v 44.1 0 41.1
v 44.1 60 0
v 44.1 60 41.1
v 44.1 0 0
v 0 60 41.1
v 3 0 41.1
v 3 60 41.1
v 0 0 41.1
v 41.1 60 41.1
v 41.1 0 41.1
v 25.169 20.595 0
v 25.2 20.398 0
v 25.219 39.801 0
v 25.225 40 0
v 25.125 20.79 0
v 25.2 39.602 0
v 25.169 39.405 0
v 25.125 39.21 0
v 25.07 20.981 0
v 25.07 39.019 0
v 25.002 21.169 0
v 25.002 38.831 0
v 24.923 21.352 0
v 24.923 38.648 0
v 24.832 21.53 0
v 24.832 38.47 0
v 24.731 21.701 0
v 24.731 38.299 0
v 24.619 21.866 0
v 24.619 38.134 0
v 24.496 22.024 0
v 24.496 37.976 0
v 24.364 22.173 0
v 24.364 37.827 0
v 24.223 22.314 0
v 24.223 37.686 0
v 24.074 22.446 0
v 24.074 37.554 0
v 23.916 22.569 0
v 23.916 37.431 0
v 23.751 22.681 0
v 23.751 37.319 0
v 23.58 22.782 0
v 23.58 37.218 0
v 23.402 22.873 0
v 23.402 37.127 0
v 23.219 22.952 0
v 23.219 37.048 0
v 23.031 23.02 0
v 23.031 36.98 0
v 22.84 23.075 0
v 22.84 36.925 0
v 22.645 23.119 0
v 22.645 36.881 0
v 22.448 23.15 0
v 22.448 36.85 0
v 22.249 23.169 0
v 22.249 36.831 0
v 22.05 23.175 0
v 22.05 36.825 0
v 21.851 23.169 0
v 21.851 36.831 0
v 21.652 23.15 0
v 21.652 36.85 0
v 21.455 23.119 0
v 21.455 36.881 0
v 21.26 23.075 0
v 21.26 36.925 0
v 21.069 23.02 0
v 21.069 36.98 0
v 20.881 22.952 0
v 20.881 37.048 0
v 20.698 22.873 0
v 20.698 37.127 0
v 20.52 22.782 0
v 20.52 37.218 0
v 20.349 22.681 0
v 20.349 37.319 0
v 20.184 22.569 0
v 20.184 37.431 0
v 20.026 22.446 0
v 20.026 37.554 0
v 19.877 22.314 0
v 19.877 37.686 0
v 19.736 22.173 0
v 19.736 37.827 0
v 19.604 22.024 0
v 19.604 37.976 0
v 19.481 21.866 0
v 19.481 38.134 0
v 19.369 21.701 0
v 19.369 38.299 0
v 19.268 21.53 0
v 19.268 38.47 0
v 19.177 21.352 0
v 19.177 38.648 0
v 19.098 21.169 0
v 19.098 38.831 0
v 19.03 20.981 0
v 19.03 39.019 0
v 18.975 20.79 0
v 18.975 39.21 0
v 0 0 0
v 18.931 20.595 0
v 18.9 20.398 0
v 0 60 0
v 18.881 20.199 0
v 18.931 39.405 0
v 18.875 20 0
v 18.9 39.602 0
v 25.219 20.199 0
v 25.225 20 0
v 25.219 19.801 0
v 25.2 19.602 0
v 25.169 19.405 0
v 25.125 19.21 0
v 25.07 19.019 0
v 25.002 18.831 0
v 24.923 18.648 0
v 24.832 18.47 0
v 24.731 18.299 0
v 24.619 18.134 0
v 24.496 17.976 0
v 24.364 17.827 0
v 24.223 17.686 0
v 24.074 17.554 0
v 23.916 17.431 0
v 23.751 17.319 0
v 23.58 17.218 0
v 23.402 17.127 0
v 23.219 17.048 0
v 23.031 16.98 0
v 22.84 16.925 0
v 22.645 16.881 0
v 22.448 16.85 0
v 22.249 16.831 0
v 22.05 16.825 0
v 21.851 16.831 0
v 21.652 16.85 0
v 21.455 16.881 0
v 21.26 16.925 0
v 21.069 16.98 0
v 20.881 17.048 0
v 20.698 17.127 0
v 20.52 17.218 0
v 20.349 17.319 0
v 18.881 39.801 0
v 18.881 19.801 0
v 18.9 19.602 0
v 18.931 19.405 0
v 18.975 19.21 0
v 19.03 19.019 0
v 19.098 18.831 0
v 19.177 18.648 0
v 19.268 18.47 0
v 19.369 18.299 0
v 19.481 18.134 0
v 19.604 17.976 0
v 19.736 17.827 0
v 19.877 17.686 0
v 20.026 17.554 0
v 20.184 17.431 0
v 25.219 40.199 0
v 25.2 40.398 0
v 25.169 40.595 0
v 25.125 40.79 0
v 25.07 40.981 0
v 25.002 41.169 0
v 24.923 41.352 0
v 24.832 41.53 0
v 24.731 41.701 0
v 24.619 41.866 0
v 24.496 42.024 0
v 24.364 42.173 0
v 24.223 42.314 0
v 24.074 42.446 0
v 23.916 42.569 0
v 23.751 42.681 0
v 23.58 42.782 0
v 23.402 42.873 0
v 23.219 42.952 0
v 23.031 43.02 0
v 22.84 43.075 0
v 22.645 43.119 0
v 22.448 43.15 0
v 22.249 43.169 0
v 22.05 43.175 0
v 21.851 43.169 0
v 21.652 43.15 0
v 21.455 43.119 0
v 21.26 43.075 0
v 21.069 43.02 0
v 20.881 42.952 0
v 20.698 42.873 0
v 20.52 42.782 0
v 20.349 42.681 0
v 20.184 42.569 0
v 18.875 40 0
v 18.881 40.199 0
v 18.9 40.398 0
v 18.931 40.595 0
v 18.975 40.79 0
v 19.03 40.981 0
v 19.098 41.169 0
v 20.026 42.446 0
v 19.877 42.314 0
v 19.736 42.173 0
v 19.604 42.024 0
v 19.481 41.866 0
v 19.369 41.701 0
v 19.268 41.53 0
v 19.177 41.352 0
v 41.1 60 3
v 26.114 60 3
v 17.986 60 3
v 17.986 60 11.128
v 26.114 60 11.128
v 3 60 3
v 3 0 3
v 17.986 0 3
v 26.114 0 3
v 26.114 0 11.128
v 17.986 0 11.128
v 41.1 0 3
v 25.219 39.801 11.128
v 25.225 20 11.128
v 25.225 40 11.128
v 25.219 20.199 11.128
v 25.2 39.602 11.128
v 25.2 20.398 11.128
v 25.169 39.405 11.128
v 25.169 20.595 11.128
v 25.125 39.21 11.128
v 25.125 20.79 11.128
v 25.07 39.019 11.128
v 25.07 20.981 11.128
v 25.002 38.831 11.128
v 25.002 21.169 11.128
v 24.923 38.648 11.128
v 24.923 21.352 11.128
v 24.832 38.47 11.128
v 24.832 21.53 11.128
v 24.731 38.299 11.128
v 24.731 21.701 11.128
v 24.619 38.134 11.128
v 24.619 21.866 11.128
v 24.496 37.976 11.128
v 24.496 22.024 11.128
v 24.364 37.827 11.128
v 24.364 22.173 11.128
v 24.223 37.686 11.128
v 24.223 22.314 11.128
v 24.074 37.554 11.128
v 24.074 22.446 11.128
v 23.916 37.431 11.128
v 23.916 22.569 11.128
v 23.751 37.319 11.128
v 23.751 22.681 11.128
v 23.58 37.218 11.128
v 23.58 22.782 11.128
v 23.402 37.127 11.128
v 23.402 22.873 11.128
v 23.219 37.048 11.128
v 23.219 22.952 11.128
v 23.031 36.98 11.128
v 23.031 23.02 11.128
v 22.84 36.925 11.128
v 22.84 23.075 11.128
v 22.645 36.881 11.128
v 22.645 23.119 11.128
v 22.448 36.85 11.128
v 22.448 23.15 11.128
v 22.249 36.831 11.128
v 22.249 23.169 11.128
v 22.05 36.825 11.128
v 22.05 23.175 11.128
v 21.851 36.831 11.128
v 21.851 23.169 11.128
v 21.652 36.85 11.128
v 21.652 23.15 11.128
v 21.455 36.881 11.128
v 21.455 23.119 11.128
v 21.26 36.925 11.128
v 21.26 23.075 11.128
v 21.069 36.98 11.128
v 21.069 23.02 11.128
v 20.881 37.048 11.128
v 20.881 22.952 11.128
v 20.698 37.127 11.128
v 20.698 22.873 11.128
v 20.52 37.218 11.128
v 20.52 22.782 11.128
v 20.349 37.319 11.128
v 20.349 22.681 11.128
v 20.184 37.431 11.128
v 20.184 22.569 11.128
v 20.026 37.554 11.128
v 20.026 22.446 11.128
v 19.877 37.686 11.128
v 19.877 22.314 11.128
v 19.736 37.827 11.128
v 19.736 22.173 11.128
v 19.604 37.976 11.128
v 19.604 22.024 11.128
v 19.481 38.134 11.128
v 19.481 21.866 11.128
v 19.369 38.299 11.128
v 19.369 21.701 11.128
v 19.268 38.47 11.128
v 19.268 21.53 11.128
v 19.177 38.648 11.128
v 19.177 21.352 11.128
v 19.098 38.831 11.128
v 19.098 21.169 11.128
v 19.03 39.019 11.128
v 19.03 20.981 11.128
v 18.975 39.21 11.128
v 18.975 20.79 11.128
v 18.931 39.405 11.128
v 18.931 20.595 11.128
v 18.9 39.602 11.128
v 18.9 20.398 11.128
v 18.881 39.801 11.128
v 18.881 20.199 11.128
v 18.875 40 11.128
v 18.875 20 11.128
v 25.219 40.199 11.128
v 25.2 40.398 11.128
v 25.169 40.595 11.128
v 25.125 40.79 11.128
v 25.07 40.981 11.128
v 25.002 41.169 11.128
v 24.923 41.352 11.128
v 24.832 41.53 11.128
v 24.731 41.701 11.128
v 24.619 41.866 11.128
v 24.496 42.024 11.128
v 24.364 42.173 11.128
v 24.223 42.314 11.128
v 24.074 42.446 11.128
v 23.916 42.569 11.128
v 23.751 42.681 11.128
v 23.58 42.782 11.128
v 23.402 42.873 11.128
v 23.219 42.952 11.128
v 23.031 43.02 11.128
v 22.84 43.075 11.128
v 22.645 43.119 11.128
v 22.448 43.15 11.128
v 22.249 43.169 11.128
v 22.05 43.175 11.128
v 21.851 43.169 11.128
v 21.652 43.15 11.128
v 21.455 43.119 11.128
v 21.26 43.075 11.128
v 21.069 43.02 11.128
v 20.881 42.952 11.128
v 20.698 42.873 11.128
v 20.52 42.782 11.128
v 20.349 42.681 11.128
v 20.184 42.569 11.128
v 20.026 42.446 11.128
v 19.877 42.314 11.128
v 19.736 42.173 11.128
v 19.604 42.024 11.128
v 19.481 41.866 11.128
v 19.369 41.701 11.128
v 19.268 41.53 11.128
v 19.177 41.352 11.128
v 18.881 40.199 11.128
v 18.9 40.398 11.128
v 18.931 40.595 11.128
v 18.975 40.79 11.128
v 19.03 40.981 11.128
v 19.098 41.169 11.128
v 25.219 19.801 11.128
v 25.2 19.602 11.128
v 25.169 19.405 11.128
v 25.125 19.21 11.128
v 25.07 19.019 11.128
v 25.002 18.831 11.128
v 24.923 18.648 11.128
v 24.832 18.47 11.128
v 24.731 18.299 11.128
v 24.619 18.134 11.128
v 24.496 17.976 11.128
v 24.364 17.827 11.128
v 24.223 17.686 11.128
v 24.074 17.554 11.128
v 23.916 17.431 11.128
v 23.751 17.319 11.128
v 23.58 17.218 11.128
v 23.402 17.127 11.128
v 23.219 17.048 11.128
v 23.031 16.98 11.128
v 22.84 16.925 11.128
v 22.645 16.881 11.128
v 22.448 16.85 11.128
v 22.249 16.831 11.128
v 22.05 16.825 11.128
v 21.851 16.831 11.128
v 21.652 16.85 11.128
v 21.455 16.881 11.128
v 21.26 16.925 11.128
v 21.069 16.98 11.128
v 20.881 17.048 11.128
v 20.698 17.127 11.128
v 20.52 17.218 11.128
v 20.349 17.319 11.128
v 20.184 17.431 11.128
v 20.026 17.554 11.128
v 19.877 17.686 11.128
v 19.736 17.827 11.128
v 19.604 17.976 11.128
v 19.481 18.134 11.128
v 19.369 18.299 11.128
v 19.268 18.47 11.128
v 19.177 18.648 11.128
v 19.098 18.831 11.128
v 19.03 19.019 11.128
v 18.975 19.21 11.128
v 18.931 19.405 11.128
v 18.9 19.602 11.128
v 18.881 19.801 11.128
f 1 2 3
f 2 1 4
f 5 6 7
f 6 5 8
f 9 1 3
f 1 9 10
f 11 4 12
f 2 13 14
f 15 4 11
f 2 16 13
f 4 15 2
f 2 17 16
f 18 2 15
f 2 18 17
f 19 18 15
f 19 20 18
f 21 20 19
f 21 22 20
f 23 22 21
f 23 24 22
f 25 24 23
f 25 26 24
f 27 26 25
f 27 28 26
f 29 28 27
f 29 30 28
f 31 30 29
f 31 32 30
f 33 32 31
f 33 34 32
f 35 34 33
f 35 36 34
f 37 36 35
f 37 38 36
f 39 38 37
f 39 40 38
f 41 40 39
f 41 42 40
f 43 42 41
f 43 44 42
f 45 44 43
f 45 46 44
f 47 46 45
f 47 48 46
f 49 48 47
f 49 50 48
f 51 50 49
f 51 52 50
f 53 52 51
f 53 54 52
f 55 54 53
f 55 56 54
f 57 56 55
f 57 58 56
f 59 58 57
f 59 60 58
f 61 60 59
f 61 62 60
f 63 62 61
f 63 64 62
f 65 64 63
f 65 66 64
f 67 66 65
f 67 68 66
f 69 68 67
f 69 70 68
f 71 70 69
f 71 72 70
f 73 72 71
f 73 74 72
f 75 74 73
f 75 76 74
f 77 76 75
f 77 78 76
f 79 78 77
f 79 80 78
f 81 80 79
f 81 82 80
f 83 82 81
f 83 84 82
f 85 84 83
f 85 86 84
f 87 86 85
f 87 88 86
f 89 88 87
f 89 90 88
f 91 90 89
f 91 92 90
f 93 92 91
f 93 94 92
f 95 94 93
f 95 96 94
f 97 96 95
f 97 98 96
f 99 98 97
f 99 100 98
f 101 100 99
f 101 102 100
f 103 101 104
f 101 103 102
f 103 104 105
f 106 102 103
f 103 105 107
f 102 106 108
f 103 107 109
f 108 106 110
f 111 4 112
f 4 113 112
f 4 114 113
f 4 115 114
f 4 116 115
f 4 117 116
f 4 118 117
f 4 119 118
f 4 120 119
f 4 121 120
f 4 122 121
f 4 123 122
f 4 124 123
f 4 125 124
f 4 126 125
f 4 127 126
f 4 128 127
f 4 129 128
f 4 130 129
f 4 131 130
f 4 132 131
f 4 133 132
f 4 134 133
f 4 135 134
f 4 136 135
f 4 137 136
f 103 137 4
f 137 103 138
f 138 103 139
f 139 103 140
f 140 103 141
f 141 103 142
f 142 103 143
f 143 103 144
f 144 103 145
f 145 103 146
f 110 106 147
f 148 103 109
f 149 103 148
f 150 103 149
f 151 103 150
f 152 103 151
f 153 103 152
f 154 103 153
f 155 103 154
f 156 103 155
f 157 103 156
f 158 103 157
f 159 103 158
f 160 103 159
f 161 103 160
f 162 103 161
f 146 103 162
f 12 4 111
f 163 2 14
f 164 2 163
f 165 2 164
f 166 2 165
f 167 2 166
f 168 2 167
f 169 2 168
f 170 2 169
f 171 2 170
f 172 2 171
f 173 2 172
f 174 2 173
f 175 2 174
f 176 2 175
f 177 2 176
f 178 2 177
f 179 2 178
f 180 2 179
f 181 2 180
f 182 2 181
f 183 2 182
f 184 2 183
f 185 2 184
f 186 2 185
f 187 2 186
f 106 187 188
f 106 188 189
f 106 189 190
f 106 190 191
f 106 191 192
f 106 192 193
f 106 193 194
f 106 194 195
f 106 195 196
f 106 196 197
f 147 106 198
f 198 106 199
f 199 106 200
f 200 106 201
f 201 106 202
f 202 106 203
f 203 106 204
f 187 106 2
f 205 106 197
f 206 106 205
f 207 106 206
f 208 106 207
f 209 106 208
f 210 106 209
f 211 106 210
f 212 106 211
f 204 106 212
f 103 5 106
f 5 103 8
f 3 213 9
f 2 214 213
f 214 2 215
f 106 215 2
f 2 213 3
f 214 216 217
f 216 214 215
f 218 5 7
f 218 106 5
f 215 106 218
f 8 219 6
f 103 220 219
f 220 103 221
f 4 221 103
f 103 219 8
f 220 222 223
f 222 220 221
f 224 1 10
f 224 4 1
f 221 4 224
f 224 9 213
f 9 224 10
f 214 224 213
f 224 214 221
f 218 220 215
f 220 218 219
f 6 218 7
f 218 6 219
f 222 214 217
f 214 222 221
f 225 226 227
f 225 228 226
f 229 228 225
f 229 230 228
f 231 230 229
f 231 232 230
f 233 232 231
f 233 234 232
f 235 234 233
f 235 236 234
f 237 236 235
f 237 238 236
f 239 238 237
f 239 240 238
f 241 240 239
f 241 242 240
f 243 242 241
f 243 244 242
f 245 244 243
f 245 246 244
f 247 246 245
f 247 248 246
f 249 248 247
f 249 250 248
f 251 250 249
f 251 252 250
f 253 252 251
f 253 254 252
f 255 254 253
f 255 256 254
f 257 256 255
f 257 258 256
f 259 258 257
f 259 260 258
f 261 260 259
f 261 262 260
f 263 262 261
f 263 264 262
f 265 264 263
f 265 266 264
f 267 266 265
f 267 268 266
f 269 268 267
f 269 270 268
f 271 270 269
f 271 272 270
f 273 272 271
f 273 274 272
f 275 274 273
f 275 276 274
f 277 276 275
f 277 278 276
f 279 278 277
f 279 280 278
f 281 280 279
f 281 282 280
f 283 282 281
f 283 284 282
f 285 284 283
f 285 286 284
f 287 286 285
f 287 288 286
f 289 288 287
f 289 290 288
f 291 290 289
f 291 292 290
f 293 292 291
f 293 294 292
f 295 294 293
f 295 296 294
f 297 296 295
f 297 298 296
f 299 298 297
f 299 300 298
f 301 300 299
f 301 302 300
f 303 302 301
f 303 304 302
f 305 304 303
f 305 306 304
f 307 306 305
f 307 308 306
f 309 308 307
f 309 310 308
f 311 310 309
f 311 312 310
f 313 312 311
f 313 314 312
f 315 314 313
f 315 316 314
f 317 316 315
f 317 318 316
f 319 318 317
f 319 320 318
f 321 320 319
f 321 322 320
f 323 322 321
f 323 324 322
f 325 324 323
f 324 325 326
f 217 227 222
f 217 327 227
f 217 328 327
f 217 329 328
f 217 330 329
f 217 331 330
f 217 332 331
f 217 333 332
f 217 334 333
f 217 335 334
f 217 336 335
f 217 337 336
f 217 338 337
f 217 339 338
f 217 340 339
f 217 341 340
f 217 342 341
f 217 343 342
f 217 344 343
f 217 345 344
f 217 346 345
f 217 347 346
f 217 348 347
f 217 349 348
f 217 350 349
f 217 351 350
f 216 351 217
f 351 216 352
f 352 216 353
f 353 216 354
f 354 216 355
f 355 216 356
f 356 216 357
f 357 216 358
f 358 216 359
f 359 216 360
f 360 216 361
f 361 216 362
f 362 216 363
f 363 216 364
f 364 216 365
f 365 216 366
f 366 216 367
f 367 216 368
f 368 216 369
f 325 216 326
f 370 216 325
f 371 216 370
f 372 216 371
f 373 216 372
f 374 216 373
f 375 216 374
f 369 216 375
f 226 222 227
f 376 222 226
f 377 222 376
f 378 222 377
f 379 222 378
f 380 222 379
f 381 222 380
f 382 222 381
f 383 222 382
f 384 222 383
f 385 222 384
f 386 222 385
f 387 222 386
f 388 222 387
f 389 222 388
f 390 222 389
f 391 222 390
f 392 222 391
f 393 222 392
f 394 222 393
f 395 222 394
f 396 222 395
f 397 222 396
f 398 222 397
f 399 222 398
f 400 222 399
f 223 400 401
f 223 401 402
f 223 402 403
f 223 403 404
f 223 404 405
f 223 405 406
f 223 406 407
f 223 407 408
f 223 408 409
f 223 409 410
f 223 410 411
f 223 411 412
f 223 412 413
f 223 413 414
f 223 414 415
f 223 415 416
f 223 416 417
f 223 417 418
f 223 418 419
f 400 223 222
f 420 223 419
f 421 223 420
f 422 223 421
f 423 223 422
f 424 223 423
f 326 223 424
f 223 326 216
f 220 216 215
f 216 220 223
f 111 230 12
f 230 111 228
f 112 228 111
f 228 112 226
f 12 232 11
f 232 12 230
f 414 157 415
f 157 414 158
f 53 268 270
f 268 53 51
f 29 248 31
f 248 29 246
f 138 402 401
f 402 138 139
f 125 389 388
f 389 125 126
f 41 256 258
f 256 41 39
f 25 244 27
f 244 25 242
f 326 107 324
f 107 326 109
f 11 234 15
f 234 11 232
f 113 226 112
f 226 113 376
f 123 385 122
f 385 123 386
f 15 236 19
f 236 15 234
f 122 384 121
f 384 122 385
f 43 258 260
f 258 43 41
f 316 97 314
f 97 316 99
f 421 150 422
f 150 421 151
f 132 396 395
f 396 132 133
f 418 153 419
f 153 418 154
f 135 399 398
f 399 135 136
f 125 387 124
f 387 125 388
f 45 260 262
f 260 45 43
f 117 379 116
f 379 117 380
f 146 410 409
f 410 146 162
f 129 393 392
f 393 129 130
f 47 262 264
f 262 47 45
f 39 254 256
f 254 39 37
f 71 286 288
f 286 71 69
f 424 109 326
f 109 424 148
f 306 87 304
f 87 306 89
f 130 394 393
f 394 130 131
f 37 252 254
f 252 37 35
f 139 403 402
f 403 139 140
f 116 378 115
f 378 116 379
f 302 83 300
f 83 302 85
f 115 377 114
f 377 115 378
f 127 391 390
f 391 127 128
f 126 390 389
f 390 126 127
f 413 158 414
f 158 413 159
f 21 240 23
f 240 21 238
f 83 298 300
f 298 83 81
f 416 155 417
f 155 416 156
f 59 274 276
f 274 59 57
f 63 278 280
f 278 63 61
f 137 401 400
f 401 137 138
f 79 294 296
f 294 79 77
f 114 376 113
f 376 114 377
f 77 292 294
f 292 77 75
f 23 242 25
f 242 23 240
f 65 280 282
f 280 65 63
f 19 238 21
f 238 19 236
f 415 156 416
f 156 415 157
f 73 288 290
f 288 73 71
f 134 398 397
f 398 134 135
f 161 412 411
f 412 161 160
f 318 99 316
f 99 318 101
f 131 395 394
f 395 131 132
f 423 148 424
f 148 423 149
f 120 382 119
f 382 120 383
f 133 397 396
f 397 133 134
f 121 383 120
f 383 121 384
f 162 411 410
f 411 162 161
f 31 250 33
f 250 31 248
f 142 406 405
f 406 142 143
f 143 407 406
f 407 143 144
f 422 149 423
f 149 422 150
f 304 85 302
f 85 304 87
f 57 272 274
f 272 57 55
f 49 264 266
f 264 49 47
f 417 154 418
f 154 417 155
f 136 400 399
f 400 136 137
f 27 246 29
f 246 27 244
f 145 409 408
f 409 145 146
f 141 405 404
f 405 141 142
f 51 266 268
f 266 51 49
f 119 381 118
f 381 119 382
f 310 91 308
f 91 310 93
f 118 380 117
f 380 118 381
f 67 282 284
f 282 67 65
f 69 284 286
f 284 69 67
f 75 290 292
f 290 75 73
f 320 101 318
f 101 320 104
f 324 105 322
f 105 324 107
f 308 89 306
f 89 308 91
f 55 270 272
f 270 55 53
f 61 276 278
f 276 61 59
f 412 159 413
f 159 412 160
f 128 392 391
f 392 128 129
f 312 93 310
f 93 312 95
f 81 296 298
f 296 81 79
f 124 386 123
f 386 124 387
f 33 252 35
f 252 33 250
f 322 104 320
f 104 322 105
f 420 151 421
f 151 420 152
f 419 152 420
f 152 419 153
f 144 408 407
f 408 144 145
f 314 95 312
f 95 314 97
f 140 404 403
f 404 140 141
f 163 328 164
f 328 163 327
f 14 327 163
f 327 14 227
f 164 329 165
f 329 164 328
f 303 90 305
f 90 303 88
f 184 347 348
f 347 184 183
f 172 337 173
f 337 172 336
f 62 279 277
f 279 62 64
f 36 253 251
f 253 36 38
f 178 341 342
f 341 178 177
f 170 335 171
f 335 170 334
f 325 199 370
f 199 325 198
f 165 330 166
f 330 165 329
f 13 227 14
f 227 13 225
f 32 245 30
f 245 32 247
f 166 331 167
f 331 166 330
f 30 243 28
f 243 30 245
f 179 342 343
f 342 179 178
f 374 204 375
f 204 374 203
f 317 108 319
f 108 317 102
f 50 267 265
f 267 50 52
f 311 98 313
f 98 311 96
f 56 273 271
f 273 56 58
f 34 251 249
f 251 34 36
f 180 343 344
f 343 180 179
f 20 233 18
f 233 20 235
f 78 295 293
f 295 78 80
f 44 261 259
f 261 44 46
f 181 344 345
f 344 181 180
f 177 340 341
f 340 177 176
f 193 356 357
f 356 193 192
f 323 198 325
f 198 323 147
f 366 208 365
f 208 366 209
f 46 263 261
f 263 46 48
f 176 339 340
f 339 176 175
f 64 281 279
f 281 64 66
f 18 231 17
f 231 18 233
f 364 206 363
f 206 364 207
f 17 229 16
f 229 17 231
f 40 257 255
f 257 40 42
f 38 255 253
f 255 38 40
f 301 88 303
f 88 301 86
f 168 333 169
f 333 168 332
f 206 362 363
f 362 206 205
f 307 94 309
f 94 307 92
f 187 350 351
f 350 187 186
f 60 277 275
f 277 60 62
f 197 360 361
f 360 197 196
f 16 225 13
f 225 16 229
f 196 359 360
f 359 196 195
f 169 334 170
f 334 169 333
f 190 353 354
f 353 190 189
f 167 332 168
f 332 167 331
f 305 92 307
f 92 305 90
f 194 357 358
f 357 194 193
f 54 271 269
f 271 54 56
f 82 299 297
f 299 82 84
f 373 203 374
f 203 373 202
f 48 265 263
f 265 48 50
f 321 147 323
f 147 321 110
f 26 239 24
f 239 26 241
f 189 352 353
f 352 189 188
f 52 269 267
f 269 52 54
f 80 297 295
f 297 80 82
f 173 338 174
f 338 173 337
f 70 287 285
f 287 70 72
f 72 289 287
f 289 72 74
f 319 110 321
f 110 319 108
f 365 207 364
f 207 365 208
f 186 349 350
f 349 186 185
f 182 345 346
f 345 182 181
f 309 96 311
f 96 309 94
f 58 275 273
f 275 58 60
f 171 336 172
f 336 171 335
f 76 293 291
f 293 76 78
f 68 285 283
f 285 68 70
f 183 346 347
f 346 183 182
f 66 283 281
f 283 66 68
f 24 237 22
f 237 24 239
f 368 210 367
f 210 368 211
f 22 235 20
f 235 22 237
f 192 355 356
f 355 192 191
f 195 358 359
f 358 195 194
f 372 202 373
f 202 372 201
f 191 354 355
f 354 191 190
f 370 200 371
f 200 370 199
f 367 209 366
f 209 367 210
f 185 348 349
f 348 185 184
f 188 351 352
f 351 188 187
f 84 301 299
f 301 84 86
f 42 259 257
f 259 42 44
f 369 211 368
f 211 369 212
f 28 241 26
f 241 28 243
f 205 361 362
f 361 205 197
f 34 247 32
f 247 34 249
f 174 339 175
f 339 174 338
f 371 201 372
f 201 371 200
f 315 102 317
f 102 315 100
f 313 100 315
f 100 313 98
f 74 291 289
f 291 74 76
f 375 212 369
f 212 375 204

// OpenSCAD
$fn = 100;
padding = 3;
xz = 38.1;
y = 60;
channel_xz = 8.128;
drill_dia = 6.35;
difference() {
  union() {
    //main hollow box
    difference() {
      cube([xz+padding*2, y, xz+padding]);
      translate([padding, -1, padding]) {
        cube([xz, y+2, xz+1]);
      }
    }
    //slot
    translate([(xz+padding*2)/2 - channel_xz/2, 0, padding]) {
      cube([channel_xz, y, channel_xz]);
    }
  }
  //hole
  translate([(xz+padding*2)/2, 20, -1]) {
    cylinder(d=drill_dia, h=xz+padding*2);
  }
  translate([(xz+padding*2)/2, 40, -1]) {
    cylinder(d=drill_dia, h=xz+padding*2);
  }
}
